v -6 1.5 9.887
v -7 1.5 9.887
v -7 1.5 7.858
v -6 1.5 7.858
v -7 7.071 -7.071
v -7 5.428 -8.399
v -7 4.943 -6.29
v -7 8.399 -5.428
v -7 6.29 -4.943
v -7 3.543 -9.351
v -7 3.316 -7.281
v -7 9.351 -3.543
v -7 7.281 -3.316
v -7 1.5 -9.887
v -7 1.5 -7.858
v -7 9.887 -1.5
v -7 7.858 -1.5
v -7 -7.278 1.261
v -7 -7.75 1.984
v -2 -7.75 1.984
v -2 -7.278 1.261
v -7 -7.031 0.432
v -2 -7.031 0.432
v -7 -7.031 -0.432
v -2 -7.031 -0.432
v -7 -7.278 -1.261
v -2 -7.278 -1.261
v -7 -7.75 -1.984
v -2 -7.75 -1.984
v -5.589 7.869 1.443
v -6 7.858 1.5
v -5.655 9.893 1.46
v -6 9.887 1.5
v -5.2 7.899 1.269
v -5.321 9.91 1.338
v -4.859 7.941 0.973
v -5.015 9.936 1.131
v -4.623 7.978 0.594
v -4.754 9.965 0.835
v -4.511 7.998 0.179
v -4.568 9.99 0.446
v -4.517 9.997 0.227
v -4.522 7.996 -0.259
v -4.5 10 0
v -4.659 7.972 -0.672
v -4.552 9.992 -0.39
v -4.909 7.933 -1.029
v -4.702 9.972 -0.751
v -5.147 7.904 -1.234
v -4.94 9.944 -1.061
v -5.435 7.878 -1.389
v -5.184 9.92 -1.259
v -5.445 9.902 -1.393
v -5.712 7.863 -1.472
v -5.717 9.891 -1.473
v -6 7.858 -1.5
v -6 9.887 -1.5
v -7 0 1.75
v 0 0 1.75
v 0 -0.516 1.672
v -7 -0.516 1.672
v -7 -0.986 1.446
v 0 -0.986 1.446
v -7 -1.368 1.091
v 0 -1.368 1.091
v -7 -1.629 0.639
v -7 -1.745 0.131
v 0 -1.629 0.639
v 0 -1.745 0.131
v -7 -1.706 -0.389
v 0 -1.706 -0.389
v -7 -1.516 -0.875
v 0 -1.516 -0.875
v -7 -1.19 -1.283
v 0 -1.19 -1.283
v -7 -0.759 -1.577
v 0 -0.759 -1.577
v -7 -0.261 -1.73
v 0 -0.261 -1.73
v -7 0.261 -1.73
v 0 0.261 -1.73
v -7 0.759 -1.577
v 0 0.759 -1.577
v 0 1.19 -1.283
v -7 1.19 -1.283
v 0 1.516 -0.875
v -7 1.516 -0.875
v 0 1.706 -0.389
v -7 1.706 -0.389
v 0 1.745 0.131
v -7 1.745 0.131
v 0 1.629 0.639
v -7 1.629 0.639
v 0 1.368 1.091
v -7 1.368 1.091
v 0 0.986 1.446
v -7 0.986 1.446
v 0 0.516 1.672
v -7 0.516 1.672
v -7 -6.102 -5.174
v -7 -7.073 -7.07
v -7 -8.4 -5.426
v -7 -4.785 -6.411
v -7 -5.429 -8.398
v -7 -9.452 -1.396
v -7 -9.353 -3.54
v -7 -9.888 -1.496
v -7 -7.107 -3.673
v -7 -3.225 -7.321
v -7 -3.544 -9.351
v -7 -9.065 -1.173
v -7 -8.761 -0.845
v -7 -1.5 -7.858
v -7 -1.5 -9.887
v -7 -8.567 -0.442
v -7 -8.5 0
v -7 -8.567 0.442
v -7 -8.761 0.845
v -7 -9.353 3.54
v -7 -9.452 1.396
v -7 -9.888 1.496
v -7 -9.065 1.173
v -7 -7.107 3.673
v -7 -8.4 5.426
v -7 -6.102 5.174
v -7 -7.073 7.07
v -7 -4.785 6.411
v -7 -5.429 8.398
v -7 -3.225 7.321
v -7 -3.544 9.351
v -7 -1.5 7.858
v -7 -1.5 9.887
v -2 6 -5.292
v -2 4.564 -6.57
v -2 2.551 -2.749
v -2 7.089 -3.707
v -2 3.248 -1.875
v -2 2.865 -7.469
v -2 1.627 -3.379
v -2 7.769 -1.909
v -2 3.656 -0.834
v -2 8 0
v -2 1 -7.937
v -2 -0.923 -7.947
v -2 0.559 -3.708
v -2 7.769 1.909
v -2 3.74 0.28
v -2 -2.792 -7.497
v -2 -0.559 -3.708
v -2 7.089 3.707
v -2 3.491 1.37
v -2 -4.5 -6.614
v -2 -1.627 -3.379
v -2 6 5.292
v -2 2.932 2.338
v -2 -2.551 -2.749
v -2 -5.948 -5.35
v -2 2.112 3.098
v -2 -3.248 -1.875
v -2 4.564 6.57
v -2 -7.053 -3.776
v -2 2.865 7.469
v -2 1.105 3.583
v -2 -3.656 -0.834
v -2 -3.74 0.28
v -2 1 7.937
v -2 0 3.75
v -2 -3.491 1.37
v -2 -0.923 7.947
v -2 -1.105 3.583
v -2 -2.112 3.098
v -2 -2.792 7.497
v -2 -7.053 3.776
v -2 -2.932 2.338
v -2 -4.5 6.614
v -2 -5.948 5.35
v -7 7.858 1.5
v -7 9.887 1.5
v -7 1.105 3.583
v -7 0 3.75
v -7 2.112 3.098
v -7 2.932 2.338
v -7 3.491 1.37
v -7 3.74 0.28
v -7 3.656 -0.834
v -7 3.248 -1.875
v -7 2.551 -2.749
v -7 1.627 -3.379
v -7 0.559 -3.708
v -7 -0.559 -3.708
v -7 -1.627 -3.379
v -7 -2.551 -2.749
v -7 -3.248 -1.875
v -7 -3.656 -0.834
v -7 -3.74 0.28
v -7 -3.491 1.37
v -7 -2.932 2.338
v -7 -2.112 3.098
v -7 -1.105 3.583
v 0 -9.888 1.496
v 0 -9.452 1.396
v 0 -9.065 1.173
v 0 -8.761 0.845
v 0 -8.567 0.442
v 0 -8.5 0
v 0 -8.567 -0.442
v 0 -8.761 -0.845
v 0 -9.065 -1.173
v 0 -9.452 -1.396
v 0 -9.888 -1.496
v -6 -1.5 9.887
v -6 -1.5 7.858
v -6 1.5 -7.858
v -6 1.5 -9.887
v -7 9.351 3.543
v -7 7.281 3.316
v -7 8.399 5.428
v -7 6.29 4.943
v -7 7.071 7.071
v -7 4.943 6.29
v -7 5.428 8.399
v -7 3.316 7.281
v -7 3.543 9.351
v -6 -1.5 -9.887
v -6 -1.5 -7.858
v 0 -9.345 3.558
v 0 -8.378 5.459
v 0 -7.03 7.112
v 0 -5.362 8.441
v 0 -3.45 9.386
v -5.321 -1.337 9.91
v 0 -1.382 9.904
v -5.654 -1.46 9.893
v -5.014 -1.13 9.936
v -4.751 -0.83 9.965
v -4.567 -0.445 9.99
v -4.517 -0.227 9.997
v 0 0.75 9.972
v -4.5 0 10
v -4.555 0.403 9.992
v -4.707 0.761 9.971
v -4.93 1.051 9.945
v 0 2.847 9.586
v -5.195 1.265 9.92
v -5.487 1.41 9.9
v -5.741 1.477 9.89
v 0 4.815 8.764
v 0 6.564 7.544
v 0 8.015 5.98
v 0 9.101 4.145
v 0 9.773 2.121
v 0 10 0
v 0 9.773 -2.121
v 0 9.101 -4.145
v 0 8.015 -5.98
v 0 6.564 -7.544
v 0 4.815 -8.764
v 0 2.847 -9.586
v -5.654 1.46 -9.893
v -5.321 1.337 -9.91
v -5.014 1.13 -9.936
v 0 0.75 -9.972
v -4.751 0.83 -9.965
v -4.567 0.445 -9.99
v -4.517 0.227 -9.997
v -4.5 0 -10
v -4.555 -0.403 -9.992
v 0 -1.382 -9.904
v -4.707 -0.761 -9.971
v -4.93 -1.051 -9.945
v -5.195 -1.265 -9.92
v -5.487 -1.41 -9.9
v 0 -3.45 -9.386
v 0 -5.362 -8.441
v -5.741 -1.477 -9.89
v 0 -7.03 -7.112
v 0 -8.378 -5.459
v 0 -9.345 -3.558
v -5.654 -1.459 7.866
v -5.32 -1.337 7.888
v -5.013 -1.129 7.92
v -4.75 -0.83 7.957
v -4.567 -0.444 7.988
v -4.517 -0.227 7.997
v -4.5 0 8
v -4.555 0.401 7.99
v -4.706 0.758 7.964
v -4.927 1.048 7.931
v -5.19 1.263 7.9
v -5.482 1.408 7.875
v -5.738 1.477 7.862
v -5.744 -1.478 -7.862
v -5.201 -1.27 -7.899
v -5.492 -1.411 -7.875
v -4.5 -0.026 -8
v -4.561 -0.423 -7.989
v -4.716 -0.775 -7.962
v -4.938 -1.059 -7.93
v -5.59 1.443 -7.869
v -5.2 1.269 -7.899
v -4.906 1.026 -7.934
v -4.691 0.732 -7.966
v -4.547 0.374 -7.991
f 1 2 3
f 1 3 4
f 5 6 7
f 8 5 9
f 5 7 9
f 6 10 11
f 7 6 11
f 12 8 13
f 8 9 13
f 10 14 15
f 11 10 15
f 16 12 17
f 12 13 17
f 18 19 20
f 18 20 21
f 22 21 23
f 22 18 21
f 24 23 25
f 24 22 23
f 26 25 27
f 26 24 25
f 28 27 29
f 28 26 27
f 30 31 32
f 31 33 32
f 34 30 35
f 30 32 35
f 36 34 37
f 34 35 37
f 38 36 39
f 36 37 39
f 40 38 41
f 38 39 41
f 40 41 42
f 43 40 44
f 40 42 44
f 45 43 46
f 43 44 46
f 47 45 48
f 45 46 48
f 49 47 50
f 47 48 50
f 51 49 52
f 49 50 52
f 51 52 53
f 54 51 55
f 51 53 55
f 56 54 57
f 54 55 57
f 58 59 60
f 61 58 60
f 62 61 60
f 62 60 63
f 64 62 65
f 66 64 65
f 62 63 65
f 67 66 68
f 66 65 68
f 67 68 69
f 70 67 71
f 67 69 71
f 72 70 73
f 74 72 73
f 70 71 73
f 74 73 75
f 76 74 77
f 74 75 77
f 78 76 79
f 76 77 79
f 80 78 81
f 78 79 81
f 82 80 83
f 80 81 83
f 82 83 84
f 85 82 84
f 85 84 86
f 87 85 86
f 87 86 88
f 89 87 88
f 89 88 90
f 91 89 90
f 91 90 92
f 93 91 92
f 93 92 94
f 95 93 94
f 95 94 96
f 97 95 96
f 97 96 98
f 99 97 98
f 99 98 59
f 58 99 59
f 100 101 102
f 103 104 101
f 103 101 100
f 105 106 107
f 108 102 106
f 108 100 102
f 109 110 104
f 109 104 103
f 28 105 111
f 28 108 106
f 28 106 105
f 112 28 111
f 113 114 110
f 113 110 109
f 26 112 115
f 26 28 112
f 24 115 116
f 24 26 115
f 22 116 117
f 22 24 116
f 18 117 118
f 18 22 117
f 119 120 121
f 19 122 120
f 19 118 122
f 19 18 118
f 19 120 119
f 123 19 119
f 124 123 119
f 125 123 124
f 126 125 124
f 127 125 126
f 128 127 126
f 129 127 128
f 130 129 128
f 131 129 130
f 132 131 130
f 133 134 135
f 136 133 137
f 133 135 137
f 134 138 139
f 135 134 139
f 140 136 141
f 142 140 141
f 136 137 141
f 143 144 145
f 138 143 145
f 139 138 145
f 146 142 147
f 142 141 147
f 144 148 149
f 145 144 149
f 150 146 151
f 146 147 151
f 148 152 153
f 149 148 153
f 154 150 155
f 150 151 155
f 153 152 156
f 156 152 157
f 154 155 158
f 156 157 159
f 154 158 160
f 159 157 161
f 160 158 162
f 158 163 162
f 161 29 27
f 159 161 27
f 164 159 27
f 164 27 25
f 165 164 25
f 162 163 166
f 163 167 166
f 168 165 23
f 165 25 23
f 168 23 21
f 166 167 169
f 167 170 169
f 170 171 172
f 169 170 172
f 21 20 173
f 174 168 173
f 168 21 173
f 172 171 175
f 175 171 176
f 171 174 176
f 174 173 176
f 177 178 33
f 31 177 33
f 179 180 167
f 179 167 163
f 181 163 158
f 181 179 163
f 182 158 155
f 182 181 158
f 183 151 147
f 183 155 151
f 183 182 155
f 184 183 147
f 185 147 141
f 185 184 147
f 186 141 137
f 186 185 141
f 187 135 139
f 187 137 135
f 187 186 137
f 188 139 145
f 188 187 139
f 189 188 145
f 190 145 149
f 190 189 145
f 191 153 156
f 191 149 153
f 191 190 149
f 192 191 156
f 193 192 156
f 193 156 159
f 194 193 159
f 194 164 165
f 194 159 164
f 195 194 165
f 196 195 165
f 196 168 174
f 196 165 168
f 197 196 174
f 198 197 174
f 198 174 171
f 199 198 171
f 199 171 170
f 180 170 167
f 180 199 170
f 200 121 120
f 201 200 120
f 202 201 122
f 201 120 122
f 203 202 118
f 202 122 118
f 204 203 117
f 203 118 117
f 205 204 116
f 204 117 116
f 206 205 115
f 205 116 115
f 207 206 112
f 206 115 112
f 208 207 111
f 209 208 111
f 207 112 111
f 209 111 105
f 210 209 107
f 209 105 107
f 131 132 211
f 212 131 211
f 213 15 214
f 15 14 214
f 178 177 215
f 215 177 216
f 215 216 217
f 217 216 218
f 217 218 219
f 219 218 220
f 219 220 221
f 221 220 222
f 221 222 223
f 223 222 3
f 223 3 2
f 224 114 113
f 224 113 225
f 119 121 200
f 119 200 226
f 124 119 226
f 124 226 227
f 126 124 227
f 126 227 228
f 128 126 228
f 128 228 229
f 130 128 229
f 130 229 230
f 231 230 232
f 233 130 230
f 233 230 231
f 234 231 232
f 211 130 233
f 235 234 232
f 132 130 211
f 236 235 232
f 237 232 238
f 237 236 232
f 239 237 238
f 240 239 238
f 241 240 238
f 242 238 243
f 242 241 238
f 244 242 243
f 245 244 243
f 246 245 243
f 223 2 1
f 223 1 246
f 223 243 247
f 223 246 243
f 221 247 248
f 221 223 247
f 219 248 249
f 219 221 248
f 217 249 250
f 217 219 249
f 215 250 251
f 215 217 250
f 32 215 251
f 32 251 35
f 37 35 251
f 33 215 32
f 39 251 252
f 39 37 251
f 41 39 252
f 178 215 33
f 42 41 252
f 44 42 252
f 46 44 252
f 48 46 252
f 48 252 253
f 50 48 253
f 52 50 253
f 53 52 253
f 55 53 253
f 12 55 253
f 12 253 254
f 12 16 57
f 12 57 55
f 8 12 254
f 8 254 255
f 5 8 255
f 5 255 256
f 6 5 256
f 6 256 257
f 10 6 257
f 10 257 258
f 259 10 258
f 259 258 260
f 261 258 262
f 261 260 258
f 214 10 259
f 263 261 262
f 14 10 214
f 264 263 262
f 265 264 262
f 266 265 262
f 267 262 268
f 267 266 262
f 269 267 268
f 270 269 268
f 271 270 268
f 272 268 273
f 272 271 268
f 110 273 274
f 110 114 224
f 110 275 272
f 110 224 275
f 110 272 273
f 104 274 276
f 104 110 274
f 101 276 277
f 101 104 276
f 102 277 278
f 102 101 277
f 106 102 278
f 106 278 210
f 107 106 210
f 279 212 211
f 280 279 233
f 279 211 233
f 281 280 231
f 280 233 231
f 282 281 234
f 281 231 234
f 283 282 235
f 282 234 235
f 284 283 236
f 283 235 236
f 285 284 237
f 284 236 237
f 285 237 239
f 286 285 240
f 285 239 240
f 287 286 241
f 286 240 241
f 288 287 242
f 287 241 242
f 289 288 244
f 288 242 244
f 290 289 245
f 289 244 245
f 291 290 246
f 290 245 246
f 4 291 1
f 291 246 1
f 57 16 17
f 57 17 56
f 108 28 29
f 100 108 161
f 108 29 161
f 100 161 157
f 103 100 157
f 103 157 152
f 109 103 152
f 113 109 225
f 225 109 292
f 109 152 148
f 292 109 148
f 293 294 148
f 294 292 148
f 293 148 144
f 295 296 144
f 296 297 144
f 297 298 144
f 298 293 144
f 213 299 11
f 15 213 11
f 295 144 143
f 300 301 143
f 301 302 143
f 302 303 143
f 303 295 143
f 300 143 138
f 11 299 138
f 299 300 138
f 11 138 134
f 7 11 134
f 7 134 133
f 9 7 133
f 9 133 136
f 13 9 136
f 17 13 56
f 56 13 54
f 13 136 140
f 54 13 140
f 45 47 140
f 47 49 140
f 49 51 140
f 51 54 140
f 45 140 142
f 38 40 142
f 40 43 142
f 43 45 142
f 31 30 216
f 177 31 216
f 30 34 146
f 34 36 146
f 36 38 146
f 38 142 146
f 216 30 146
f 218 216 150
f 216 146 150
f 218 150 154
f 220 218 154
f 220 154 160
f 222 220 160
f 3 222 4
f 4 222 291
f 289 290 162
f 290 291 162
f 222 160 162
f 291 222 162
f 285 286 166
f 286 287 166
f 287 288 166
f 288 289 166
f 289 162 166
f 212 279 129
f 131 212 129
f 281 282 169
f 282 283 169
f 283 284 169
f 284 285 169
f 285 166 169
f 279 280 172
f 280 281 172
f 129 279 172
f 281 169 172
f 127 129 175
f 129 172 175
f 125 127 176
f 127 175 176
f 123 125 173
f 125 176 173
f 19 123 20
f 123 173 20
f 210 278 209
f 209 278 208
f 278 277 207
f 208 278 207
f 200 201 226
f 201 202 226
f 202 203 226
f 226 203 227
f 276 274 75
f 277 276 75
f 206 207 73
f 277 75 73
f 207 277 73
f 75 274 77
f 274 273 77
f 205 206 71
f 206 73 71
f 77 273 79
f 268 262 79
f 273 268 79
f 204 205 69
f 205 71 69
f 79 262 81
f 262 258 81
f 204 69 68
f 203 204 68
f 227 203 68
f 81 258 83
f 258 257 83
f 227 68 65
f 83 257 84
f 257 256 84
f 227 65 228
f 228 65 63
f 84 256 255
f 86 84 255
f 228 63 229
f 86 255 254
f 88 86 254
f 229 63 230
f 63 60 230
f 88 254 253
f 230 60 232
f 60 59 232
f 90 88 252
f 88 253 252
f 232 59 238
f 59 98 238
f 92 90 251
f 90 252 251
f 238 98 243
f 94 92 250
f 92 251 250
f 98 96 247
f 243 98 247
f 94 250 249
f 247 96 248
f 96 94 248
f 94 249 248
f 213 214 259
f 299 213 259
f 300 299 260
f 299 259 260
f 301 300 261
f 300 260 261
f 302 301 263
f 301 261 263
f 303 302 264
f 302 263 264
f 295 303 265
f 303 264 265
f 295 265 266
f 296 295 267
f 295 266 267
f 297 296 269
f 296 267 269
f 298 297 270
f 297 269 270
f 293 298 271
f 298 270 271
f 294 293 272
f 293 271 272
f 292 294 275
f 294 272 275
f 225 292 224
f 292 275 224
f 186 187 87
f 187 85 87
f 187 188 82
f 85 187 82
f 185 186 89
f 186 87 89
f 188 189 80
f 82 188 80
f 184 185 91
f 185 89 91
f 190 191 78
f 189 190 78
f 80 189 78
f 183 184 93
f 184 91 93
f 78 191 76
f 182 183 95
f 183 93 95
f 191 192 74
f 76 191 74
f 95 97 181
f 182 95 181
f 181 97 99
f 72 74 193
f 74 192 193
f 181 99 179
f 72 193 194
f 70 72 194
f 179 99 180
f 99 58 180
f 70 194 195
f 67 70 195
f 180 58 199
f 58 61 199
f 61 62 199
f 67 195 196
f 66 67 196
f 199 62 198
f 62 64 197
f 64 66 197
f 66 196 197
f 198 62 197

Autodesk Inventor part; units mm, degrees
ref_plane "YZ Plane" through (0, 0, 0) normal (1, 0, 0) x (0, 1, 0)
ref_plane "XY Plane" through (0, 0, 0) normal (0, 0, 1) x (1, 0, 0)
sketch "Эскиз1" plane through (0, 0, 0) normal (0, 1, 0) x (-1, 0, 0)
  line L0 (5.6588, 0) -> (-7.527, 0) construction
  line L1 (0, 0) -> (0, 1.75) construction
  line L2 (0, 1.75) -> (0, 10)
  line L3 (0, 10) -> (7, 10)
  line L4 (7, 10) -> (7, 8)
  line L5 (7, 8) -> (2, 8)
  line L6 (2, 8) -> (2, 3.75)
  line L7 (2, 3.75) -> (7, 3.75)
  line L8 (7, 3.75) -> (7, 1.75)
  line L9 (7, 1.75) -> (0, 1.75)
  dimension "d0" = 1.75
  dimension "d1" = 8.25
  dimension "d2" = 7
  dimension "d3" = 2
  dimension "d4" = 5
  dimension "d5" = 4.25
  dimension "d6" = 2
revolve "Вращение1" add sketch "Эскиз1" angle 360 about axis through (-5.6588, 0, 0) along (1, 0, 0)
ref_plane "РабПлоскость1" through (0, 10, 0) normal (0, 1, 0) x (-1, 0, 0)
sketch "Эскиз3" plane through (0, 10, 0) normal (0, 1, 0) x (-1, 0, 0)
  line L0 (7, -3.75) -> (7, 3.75) construction
  line L1 (7, 0) -> (7, 1.5) construction
  line L2 (7, 1.5) -> (6, 1.5)
  line L3 (7, 0) -> (7, -1.5) construction
  line L4 (7, -1.5) -> (6, -1.5)
  arc A0 (6, 1.5) -> (6, -1.5) centre (6, 0) ccw
  line L5 (7, 1.5) -> (7, -1.5)
  point P0 (0, 0)
  dimension "d12" = 1.5
  dimension "d13" = 1
  dimension "d14" = 1.5
  dimension "d15" = 1
extrude "Выдавливание1" cut sketch "Эскиз3" against normal blind 2.5
sketch "Эскиз4" plane through (-7, 0, 0) normal (-1, 0, 0) x (0, 0, 1)
  point P0 (0, 0)
  point P1 (0, 0)
pattern_circular "Круговой массив1" count 2 over 90 about axis through (-3.5, 0, 0) along (-1, 0, 0) of "Выдавливание1"
pattern_circular "Круговой массив2" count 2 over 90 about axis through (-3.5, 0, 0) along (1, 0, 0) of "Выдавливание1"
sketch "Эскиз5" plane through (-7, -1.5, -9.8869) normal (-1, 0, 0) x (0, 0, 1)
  line L0 (9.8869, 1.5) -> (9.8869, -10.507) construction
  arc A0 (0, 0) -> (19.7737, 0) centre (9.8869, 1.5) ccw projected
  arc A1 (11.3838, -8.4049) -> (8.3911, -8.3878) centre (9.8869, -8.5) ccw
  point P0 (11.3826, -8.3875)
  point P1 (8.3911, -8.3875)
  dimension "d24" = 1.5
extrude "Выдавливание2" cut sketch "Эскиз5" against normal blind 7
sketch "Эскиз7" plane through (-7, -1.5, -9.8869) normal (-1, 0, 0) x (0, 0, 1)
  circle A0 centre (9.8869, -8.5) radius 3
  point P0 (9.8869, 1.5)
  dimension "d28" = 6
extrude "Выдавливание3" add sketch "Эскиз7" against normal blind 7
sketch "Эскиз8" plane through (-7, -1.5, -9.8869) normal (-1, 0, 0) x (0, 0, 1)
  circle A0 centre (9.8869, 1.5) radius 10
  dimension "d31" = 20
extrude "Выдавливание4" cut sketch "Эскиз8" against normal blind 7 keep common part
sketch "Эскиз9" plane through (-7, -1.5, -9.8869) normal (-1, 0, 0) x (0, 0, 1)
  circle A0 centre (9.8869, 1.5) radius 10 projected
  circle A1 centre (9.8869, -8.5) radius 1.5
  point P0 (11.3826, -8.3875)
  point P1 (8.3911, -8.3875)
  dimension "d34" = 3
extrude "Выдавливание5" cut sketch "Эскиз9" against normal blind 7 contours A1 A0 picked at (9.8869, -7.9917)
properties part number "Сердечник"
